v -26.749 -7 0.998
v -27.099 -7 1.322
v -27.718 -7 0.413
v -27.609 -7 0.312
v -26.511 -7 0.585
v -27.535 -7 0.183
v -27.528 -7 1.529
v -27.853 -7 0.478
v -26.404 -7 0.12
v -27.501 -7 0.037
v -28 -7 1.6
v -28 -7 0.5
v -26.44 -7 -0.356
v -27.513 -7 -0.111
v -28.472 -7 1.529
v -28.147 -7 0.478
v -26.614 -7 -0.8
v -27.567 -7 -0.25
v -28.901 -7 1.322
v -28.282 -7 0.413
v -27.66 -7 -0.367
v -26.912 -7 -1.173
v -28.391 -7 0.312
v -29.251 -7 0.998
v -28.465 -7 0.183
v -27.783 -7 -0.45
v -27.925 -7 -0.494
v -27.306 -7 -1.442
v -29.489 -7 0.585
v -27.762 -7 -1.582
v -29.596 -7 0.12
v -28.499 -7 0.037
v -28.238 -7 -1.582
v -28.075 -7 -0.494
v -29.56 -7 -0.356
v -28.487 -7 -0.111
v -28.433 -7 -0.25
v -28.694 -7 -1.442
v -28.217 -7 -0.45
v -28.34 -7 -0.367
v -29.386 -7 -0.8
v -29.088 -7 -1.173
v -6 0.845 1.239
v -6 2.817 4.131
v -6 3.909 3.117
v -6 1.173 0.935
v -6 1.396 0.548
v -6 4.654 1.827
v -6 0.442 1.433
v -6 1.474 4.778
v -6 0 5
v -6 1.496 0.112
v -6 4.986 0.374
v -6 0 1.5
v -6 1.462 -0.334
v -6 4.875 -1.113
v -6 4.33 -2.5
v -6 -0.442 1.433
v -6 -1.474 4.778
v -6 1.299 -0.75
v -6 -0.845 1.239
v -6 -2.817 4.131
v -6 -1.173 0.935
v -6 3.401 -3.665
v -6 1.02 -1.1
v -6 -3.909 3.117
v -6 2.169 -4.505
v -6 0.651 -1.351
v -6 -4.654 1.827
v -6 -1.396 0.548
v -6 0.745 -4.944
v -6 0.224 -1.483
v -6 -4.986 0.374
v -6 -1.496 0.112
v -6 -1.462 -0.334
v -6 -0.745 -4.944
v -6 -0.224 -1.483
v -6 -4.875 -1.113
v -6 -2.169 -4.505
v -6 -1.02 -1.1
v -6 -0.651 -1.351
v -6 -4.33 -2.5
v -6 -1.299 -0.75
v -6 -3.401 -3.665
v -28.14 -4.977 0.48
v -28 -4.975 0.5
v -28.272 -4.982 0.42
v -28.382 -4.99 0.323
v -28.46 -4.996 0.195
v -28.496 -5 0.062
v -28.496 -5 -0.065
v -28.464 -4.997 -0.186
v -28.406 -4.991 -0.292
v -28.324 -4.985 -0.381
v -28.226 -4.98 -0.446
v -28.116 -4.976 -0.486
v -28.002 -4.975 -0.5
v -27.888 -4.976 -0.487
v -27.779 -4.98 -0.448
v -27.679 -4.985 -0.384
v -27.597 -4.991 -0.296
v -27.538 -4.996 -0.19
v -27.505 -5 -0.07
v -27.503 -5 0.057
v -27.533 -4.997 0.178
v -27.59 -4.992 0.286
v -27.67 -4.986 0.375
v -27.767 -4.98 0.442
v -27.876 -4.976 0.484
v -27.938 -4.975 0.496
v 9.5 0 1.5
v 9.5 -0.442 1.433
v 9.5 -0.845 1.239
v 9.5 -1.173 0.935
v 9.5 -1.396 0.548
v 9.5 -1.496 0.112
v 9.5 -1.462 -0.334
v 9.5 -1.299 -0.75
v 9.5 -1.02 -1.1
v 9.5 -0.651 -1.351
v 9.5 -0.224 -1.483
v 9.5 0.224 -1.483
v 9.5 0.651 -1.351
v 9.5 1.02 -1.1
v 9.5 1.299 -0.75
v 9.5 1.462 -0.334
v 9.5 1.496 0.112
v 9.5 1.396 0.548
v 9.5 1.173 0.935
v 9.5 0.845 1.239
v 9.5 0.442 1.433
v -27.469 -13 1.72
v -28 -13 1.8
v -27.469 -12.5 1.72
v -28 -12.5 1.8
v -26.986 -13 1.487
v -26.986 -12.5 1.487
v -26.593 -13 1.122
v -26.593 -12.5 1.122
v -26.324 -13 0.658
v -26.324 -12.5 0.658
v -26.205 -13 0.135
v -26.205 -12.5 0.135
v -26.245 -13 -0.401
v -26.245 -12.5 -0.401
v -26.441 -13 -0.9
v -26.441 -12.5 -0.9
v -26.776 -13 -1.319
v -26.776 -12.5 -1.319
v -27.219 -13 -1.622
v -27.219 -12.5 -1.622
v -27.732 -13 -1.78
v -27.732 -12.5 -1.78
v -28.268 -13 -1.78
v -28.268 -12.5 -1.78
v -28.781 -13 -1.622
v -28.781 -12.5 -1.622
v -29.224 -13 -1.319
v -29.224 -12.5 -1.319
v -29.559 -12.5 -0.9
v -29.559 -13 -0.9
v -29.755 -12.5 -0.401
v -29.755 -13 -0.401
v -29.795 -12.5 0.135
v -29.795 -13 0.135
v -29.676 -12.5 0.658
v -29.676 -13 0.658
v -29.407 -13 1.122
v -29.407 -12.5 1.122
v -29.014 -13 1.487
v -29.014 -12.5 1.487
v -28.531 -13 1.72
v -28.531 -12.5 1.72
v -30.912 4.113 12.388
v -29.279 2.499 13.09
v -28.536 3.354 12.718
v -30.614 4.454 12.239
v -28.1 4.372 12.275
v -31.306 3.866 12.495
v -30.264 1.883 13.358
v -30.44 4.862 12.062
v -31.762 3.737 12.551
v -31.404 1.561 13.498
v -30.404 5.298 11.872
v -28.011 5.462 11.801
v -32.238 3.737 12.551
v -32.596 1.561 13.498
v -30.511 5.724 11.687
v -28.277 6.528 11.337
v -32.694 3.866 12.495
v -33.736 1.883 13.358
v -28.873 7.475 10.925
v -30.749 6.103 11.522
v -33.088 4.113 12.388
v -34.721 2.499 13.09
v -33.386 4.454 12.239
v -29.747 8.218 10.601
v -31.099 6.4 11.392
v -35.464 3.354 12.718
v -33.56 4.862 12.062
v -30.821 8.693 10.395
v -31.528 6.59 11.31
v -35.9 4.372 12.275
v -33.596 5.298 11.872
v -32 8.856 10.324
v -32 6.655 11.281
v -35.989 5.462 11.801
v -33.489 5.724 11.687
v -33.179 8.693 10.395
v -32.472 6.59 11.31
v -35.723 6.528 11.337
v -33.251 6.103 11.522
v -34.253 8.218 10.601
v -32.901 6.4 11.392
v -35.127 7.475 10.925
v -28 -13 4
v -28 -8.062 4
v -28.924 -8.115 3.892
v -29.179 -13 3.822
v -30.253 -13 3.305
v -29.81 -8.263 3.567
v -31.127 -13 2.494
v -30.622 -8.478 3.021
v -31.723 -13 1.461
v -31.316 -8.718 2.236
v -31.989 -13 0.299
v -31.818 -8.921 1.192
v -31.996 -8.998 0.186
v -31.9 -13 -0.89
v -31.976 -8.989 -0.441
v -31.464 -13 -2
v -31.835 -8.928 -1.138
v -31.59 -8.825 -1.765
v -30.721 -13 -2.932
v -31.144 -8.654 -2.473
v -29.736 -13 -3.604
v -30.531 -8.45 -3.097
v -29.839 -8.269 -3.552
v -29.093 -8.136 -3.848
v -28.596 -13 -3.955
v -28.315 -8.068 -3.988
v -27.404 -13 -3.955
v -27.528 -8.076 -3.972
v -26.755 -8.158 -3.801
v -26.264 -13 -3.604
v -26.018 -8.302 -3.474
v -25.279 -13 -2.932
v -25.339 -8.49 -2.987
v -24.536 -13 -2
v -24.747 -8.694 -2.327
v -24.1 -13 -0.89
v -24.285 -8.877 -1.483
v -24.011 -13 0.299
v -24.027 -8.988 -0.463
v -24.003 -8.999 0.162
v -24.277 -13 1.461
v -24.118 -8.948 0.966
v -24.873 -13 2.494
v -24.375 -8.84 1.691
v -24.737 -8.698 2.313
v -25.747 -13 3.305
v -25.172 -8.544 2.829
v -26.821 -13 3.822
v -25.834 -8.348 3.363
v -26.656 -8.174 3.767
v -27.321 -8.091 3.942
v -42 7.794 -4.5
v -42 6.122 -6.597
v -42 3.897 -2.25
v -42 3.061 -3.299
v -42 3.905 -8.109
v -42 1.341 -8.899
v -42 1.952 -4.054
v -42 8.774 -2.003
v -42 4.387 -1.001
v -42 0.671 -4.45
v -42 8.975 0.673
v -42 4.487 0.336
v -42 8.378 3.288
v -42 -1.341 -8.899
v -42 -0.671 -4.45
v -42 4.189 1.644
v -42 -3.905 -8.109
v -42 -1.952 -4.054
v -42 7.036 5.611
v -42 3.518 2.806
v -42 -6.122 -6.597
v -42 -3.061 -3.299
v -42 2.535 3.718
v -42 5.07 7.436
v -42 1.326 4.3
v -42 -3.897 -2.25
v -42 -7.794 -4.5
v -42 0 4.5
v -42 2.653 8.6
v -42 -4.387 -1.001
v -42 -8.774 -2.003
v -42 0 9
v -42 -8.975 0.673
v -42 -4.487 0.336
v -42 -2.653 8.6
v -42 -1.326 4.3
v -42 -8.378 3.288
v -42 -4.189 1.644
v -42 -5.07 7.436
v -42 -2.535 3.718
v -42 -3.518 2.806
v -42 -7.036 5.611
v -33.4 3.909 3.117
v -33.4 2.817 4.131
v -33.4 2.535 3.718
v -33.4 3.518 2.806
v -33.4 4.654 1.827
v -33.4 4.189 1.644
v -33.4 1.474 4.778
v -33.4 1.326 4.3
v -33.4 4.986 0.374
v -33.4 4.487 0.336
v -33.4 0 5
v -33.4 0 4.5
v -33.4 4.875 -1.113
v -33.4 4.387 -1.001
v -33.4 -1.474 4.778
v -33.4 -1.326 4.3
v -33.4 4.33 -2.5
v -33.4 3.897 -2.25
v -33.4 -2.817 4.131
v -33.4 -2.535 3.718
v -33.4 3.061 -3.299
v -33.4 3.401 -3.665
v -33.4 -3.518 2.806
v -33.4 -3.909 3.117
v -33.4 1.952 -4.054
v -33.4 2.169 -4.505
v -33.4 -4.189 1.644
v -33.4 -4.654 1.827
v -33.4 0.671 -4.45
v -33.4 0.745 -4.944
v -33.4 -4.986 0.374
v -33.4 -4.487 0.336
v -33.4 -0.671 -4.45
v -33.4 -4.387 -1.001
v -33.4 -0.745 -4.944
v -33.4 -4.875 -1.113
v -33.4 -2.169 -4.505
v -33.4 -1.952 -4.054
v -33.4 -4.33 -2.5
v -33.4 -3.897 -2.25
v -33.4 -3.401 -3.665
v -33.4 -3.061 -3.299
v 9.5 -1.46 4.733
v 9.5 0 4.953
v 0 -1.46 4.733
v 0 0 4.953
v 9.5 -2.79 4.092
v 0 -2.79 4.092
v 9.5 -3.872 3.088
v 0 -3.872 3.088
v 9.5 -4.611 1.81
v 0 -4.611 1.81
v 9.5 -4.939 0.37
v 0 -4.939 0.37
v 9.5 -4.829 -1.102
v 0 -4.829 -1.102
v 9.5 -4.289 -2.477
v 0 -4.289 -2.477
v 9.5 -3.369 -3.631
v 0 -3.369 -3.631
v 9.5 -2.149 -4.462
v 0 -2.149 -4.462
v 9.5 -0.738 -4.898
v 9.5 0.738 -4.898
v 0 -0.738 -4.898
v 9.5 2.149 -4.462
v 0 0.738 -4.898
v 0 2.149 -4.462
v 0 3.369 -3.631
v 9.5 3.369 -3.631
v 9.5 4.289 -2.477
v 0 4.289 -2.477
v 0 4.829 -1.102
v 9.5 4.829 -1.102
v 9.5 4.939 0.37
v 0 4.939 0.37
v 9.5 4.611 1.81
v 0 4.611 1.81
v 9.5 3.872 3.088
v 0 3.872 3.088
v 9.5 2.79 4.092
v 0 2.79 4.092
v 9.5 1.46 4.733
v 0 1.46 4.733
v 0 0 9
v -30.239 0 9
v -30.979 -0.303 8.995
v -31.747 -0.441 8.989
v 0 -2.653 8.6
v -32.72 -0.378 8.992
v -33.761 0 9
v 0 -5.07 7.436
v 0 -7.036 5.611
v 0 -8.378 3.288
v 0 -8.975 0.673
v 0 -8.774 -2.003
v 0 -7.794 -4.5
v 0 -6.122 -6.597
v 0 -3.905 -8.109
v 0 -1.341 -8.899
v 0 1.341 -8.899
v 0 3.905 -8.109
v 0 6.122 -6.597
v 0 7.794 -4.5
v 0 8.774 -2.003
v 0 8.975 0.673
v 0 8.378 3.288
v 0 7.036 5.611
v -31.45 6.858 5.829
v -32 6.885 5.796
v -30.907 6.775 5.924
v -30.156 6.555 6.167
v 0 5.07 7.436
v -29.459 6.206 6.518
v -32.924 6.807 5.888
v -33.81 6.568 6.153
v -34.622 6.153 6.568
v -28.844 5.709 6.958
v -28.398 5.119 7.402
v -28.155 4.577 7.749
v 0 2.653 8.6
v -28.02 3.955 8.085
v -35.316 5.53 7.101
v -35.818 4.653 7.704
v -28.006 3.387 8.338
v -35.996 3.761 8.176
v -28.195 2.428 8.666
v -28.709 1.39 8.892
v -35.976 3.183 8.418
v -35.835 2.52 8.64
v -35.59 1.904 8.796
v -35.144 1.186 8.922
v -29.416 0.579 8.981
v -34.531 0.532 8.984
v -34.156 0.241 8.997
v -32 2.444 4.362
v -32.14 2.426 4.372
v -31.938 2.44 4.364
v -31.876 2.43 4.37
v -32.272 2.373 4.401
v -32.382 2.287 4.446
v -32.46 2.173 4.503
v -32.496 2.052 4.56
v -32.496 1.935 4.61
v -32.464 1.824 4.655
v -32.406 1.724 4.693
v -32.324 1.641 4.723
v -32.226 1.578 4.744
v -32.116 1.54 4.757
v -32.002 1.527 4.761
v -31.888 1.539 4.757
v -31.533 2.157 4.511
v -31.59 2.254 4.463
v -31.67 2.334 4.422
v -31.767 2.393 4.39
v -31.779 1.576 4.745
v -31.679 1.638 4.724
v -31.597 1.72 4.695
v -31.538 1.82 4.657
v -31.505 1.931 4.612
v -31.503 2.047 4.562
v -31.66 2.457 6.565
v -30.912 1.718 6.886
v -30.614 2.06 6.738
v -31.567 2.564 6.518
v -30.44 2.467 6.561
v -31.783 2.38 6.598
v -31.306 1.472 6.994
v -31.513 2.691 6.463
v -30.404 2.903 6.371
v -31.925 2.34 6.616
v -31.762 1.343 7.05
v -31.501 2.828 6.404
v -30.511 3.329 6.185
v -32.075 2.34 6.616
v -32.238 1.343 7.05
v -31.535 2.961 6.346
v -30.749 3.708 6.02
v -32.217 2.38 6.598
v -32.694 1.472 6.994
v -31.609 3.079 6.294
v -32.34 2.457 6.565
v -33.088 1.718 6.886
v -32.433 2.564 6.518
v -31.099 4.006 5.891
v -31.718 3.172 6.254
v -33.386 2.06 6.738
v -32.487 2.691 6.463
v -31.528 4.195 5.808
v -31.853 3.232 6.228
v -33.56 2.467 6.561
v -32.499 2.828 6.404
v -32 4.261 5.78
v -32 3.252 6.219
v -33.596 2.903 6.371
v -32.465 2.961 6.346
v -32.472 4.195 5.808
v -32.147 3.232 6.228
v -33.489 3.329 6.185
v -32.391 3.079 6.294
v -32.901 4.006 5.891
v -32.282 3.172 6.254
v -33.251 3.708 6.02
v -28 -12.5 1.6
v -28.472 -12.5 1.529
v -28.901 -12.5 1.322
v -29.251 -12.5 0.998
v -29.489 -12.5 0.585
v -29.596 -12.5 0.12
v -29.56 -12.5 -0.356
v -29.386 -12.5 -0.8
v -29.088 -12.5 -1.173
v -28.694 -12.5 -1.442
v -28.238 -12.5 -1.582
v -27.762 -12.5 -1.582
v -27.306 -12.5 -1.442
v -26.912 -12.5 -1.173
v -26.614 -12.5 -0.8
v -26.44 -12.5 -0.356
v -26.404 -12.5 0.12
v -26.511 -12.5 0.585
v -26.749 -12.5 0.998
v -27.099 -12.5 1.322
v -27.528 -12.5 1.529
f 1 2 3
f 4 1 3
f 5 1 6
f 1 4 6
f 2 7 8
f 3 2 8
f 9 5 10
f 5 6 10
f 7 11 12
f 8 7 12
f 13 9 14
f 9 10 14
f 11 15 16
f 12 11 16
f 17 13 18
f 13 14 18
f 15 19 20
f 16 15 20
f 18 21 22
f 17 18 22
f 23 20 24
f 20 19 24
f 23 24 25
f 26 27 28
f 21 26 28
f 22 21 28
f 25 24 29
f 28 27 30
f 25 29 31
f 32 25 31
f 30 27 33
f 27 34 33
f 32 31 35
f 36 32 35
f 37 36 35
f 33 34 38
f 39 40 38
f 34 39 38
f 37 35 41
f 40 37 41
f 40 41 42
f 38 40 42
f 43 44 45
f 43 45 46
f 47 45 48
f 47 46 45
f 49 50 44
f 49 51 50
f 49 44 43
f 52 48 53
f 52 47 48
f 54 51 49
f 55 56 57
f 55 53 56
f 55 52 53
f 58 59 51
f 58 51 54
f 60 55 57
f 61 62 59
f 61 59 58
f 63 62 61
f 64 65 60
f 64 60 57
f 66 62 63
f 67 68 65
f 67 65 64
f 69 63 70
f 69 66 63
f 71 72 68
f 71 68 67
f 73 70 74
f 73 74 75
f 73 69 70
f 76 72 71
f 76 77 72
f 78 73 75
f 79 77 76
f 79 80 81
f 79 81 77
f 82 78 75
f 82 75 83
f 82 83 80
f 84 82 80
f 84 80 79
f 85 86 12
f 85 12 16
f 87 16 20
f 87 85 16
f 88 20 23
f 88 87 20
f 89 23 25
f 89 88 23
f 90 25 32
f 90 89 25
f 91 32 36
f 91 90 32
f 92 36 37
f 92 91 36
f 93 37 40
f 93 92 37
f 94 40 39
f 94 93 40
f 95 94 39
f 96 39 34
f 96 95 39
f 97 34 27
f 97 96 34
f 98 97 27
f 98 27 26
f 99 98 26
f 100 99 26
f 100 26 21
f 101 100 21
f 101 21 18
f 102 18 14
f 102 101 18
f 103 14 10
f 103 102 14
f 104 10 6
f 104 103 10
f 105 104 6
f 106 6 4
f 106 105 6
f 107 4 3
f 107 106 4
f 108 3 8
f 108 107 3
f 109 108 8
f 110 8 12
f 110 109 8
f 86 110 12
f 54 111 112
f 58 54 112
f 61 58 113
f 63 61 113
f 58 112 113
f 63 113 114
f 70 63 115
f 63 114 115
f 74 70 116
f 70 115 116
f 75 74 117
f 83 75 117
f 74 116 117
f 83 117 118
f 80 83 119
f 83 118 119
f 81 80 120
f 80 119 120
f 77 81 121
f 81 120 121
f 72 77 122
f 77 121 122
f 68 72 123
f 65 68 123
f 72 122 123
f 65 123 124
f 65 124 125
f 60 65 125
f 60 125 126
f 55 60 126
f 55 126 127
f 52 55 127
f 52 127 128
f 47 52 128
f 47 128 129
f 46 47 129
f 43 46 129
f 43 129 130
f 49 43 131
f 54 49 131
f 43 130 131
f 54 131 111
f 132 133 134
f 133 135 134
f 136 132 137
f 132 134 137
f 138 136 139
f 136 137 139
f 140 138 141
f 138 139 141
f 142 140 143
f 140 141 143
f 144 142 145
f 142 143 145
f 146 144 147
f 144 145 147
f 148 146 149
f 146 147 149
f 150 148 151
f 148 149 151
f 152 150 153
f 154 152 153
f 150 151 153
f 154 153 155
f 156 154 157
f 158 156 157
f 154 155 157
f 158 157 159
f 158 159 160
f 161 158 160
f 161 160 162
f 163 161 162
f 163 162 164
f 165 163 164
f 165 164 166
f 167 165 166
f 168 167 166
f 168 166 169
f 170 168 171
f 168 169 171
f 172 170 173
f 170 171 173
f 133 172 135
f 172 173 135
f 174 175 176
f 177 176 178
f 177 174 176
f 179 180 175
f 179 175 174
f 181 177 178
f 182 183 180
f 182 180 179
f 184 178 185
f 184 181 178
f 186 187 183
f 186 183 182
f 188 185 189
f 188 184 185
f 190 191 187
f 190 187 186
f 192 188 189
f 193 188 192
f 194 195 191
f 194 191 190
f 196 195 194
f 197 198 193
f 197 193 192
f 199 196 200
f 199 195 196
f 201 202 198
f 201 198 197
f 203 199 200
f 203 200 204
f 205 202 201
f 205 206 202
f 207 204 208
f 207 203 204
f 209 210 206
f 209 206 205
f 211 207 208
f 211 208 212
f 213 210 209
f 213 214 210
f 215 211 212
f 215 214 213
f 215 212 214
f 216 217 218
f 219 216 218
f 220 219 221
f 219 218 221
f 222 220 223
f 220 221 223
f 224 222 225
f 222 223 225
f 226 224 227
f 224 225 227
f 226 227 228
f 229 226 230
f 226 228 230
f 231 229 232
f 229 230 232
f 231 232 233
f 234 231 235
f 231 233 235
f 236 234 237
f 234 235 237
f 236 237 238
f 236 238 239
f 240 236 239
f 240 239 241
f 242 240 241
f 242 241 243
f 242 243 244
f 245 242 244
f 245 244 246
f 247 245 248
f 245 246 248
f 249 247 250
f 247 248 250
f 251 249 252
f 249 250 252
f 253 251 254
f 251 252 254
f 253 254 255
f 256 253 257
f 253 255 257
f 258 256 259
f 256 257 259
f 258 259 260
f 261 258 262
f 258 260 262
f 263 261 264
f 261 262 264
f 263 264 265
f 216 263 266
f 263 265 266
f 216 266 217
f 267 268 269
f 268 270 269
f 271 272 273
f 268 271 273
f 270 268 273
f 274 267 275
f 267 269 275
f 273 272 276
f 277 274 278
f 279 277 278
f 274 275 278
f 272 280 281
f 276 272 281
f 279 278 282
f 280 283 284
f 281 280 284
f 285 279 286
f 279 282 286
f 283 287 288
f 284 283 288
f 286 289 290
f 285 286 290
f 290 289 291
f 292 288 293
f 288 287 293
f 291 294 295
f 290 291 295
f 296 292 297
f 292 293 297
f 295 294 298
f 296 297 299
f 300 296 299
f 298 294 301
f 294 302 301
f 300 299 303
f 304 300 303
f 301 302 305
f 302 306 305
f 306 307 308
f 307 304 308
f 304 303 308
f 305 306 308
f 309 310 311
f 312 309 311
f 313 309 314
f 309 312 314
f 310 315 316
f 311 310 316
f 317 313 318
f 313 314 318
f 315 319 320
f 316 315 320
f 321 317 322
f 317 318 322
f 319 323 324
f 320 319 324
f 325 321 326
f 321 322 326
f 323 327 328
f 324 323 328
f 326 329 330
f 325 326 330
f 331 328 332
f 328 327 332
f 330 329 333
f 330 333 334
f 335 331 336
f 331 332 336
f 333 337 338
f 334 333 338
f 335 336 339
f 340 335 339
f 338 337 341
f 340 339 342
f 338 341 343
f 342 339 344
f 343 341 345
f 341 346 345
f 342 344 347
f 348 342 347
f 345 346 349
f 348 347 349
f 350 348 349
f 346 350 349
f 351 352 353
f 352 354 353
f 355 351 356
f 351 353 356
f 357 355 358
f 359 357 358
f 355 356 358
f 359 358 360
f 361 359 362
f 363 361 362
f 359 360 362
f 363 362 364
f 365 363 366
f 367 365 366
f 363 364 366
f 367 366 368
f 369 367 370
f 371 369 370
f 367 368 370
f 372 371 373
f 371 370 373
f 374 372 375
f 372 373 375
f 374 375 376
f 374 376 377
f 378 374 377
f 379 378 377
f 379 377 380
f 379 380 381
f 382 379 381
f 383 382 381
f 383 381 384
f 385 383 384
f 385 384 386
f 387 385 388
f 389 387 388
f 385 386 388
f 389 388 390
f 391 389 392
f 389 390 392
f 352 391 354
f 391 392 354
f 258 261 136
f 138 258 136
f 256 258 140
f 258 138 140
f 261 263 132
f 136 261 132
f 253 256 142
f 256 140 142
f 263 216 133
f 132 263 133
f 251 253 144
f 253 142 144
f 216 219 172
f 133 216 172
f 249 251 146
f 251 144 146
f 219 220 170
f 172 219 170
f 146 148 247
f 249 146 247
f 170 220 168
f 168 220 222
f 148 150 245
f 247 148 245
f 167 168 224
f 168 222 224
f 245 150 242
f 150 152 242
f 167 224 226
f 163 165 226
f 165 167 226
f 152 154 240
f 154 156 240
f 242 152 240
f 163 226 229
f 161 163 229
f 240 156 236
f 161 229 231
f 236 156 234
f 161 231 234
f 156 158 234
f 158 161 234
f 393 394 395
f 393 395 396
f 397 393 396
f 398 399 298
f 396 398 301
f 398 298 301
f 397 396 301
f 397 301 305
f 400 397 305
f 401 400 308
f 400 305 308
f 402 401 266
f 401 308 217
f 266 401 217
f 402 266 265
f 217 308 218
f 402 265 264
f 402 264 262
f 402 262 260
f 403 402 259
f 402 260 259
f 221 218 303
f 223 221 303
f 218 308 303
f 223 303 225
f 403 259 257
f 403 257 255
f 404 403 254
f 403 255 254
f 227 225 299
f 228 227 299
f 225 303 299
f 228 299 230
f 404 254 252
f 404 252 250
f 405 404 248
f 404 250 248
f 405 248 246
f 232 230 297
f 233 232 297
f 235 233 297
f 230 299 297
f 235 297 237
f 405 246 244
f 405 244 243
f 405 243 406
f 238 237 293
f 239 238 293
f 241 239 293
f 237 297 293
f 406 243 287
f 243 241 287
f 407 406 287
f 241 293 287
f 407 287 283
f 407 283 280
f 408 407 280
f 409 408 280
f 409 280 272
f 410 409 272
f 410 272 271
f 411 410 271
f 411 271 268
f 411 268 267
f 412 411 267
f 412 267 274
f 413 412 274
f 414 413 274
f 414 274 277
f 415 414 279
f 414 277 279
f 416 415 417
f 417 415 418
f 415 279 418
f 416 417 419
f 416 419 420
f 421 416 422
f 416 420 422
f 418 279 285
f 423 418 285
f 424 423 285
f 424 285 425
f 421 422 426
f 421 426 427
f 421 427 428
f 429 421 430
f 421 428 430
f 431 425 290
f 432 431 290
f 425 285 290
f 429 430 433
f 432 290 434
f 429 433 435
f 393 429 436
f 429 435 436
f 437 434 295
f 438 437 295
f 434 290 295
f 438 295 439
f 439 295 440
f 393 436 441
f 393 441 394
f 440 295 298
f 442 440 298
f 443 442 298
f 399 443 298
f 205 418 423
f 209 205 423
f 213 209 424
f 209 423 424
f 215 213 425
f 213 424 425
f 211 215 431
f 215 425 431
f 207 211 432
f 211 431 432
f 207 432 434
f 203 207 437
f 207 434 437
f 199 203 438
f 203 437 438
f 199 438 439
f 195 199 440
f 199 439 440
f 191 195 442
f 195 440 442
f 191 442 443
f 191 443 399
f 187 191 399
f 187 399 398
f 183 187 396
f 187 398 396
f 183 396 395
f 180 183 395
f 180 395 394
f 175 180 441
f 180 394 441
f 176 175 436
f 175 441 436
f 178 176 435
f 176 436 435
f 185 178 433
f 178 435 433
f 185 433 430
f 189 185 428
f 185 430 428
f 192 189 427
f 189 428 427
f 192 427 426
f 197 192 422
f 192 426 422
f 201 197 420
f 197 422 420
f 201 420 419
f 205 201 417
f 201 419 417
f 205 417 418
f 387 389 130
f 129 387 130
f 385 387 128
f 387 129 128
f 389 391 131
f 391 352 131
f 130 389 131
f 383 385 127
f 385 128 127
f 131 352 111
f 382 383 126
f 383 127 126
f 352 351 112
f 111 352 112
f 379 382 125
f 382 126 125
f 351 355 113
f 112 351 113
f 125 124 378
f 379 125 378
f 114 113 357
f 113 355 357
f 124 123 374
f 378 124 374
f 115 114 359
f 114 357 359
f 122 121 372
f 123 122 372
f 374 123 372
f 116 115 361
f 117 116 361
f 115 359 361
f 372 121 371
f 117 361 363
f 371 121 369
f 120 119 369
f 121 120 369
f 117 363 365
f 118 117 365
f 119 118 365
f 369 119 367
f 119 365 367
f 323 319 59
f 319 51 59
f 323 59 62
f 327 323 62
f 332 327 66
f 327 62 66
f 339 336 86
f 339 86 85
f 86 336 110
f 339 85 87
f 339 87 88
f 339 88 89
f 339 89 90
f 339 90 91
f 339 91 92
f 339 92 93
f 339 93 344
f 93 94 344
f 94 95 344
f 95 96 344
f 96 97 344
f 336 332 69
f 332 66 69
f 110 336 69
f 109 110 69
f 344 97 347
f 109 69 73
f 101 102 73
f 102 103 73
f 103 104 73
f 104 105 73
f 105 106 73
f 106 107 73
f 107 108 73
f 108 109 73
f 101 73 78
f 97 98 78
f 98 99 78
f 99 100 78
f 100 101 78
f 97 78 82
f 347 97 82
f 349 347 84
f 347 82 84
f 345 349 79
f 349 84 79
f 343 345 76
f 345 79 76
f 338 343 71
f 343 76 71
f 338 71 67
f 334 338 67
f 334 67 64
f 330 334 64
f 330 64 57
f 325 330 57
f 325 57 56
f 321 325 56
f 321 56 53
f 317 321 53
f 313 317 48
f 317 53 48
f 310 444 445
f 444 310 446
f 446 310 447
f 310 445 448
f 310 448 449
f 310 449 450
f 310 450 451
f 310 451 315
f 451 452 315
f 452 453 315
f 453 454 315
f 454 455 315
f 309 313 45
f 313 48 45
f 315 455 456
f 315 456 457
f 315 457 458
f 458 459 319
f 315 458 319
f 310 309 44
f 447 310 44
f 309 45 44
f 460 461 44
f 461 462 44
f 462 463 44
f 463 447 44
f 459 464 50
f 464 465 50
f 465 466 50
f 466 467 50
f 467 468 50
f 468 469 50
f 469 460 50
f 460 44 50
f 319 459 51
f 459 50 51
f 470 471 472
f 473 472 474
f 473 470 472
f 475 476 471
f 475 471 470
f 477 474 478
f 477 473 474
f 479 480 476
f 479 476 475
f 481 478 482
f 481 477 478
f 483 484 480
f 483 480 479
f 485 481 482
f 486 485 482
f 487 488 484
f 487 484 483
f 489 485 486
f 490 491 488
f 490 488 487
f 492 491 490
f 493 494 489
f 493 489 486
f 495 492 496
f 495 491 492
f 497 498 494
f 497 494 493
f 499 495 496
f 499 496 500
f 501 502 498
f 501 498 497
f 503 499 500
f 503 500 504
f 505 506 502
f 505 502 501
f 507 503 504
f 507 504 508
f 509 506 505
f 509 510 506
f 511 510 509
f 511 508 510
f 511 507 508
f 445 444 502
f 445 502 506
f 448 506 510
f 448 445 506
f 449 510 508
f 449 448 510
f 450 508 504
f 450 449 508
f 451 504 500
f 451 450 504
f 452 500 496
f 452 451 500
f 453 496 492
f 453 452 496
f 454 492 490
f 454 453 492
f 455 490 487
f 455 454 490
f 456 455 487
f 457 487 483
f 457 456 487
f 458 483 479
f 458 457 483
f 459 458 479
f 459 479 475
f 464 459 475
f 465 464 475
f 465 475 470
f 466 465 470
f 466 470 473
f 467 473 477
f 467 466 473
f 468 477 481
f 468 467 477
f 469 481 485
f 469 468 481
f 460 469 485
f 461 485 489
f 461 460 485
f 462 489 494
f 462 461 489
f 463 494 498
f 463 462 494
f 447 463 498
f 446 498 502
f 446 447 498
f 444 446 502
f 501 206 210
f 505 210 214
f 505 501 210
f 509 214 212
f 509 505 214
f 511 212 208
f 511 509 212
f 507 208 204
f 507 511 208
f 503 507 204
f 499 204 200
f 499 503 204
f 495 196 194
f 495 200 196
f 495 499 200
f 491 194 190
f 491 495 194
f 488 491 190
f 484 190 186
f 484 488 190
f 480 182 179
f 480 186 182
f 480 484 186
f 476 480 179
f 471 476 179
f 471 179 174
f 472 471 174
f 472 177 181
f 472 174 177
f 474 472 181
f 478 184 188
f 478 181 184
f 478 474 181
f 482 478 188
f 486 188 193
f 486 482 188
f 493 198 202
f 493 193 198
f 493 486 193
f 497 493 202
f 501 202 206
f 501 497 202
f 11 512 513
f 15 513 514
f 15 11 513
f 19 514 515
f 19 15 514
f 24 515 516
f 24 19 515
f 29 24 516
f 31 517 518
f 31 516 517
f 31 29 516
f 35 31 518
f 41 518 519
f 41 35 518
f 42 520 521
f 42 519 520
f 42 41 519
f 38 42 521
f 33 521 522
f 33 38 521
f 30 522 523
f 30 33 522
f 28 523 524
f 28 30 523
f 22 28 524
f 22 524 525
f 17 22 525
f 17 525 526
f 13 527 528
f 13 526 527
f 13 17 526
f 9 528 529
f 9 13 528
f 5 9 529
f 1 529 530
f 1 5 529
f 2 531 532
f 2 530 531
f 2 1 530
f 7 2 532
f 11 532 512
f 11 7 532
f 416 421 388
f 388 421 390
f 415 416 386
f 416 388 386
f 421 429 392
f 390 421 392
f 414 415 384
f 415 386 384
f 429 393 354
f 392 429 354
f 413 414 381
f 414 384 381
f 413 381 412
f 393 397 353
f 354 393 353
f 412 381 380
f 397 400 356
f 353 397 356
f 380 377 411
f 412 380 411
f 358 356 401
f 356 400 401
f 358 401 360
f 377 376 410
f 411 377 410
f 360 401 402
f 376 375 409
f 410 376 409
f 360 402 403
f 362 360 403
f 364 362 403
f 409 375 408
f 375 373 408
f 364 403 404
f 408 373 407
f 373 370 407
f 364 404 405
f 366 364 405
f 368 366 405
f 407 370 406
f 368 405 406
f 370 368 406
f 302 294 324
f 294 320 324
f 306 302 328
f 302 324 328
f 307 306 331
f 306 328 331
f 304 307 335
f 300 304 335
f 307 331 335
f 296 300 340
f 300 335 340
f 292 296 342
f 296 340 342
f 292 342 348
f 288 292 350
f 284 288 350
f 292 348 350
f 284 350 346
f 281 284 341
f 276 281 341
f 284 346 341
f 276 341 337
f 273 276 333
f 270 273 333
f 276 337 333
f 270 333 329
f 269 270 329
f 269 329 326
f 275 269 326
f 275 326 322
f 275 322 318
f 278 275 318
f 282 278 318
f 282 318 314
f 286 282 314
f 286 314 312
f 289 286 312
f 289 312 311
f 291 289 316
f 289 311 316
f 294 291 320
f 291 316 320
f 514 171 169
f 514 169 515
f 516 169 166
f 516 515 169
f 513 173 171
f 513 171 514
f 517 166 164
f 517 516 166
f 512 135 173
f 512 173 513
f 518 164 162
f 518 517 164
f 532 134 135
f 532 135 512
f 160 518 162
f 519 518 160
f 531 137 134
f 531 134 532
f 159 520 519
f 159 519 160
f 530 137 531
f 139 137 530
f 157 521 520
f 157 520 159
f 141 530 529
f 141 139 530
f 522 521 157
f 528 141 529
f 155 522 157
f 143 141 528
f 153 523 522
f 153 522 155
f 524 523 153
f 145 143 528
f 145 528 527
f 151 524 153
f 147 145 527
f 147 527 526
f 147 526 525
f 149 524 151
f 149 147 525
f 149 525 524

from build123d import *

# Parameters (mm, degrees)
NITROUS_BOSS_SKETCH_W          = 4
NITROUS_BOSS_SKETCH_H          = 7
ETHANOL_BOSS_SKETCH_W          = 4
ETHANOL_BOSS_SKETCH_H          = 7
CHAMBER_SKETCH_W               = 27.4
CHAMBER_SKETCH_H               = 5
FLAME_PASSAGE_SKETCH_W         = 16.5
FLAME_PASSAGE_SKETCH_H         = 1.5
PLUG_HOLE_SKETCH_W             = 9.6
PLUG_HOLE_SKETCH_H             = 4.5
NITROUS_SOCKET_SKETCH_W        = 1.6
NITROUS_SOCKET_SKETCH_H        = 7
NITROUS_ORIFICE_SKETCH_W       = 0.5
NITROUS_ORIFICE_SKETCH_H       = 2.5
ETHANOL_SOCKET_SKETCH_W        = 1.6
ETHANOL_SOCKET_SKETCH_H        = 7
ETHANOL_ORIFICE_SKETCH_W       = 0.5
ETHANOL_ORIFICE_SKETCH_H       = 2.5
NITROUS_SOCKET_RELIEF_SKETCH_W = 1.8
NITROUS_SOCKET_RELIEF_SKETCH_H = 1.5


with BuildPart() as part:
    # Body Sketch → Body (revolve)
    with BuildSketch(Plane.XY):
        Polygon((9.5, 0), (9.5, 4.953), (0, 4.953), (0, 9), (-42, 9), (-42, 0), align=None)
    revolve(axis=Axis((-300, 0, 0), (1, 0, 0)))

    # Nitrous Boss Sketch → Nitrous Boss (revolve)
    with BuildSketch(Plane.XY):
        with Locations((-26, -9.5)):
            Rectangle(NITROUS_BOSS_SKETCH_W, NITROUS_BOSS_SKETCH_H)
    revolve(axis=Axis((-28, -3, 0), (0, -1, 0)))

    # Ethanol Boss Sketch → Ethanol Boss (revolve)
    with BuildSketch(Plane(origin=(0, 0, 0), x_dir=(-1, 0, 0), z_dir=(0, -0.9169188892170476, 0.3990736155109426))):
        with Locations((30, -9.5)):
            Rectangle(ETHANOL_BOSS_SKETCH_W, ETHANOL_BOSS_SKETCH_H)
    revolve(axis=Axis((-32, 1.197220847, 2.750756668), (0, 0.39907361551094256, 0.9169188892170476)))

    # Chamber Sketch → Chamber (revolve, cut)
    with BuildSketch(Plane.XY):
        with Locations((-19.7, 2.5)):
            Rectangle(CHAMBER_SKETCH_W, CHAMBER_SKETCH_H)
    revolve(axis=Axis((-300, 0, 0), (1, 0, 0)), mode=Mode.SUBTRACT)

    # Flame Passage Sketch → Flame Passage (revolve, cut)
    with BuildSketch(Plane.XY):
        with Locations((2.25, 0.75)):
            Rectangle(FLAME_PASSAGE_SKETCH_W, FLAME_PASSAGE_SKETCH_H)
    revolve(axis=Axis((-300, 0, 0), (1, 0, 0)), mode=Mode.SUBTRACT)

    # Plug Hole Sketch → Plug Hole (revolve, cut)
    with BuildSketch(Plane.XY):
        with Locations((-38.2, 2.25)):
            Rectangle(PLUG_HOLE_SKETCH_W, PLUG_HOLE_SKETCH_H)
    revolve(axis=Axis((-300, 0, 0), (1, 0, 0)), mode=Mode.SUBTRACT)

    # Nitrous Socket Sketch → Nitrous Socket (revolve, cut)
    with BuildSketch(Plane.XY):
        with Locations((-27.2, -10.5)):
            Rectangle(NITROUS_SOCKET_SKETCH_W, NITROUS_SOCKET_SKETCH_H)
    revolve(axis=Axis((-28, -4, 0), (0, -1, 0)), mode=Mode.SUBTRACT)

    # Nitrous Orifice Sketch → Nitrous Orifice (revolve, cut)
    with BuildSketch(Plane.XY):
        with Locations((-27.75, -5.75)):
            Rectangle(NITROUS_ORIFICE_SKETCH_W, NITROUS_ORIFICE_SKETCH_H)
    revolve(axis=Axis((-28, -1.5, 0), (0, -1, 0)), mode=Mode.SUBTRACT)

    # Ethanol Socket Sketch → Ethanol Socket (revolve, cut)
    with BuildSketch(Plane(origin=(0, 0, 0), x_dir=(-1, 0, 0), z_dir=(0, -0.9169188892170476, 0.3990736155109426))):
        with Locations((31.2, -10.5)):
            Rectangle(ETHANOL_SOCKET_SKETCH_W, ETHANOL_SOCKET_SKETCH_H)
    revolve(axis=Axis((-32, 1.596294462, 3.667675557), (0, 0.39907361551094267, 0.9169188892170476)), mode=Mode.SUBTRACT)

    # Ethanol Orifice Sketch → Ethanol Orifice (revolve, cut)
    with BuildSketch(Plane(origin=(0, 0, 0), x_dir=(-1, 0, 0), z_dir=(0, -0.9169188892170476, 0.3990736155109426))):
        with Locations((31.75, -5.75)):
            Rectangle(ETHANOL_ORIFICE_SKETCH_W, ETHANOL_ORIFICE_SKETCH_H)
    revolve(axis=Axis((-32, 0.598610423, 1.375378334), (0, 0.39907361551094256, 0.9169188892170476)), mode=Mode.SUBTRACT)

    # Nitrous Socket Relief Sketch → Nitrous Socket Relief (revolve, cut)
    with BuildSketch(Plane.XY):
        with Locations((-27.1, -13.25)):
            Rectangle(NITROUS_SOCKET_RELIEF_SKETCH_W, NITROUS_SOCKET_RELIEF_SKETCH_H)
    revolve(axis=Axis((-28, -18, 0), (0, 1, 0)), mode=Mode.SUBTRACT)


solid = part.part
